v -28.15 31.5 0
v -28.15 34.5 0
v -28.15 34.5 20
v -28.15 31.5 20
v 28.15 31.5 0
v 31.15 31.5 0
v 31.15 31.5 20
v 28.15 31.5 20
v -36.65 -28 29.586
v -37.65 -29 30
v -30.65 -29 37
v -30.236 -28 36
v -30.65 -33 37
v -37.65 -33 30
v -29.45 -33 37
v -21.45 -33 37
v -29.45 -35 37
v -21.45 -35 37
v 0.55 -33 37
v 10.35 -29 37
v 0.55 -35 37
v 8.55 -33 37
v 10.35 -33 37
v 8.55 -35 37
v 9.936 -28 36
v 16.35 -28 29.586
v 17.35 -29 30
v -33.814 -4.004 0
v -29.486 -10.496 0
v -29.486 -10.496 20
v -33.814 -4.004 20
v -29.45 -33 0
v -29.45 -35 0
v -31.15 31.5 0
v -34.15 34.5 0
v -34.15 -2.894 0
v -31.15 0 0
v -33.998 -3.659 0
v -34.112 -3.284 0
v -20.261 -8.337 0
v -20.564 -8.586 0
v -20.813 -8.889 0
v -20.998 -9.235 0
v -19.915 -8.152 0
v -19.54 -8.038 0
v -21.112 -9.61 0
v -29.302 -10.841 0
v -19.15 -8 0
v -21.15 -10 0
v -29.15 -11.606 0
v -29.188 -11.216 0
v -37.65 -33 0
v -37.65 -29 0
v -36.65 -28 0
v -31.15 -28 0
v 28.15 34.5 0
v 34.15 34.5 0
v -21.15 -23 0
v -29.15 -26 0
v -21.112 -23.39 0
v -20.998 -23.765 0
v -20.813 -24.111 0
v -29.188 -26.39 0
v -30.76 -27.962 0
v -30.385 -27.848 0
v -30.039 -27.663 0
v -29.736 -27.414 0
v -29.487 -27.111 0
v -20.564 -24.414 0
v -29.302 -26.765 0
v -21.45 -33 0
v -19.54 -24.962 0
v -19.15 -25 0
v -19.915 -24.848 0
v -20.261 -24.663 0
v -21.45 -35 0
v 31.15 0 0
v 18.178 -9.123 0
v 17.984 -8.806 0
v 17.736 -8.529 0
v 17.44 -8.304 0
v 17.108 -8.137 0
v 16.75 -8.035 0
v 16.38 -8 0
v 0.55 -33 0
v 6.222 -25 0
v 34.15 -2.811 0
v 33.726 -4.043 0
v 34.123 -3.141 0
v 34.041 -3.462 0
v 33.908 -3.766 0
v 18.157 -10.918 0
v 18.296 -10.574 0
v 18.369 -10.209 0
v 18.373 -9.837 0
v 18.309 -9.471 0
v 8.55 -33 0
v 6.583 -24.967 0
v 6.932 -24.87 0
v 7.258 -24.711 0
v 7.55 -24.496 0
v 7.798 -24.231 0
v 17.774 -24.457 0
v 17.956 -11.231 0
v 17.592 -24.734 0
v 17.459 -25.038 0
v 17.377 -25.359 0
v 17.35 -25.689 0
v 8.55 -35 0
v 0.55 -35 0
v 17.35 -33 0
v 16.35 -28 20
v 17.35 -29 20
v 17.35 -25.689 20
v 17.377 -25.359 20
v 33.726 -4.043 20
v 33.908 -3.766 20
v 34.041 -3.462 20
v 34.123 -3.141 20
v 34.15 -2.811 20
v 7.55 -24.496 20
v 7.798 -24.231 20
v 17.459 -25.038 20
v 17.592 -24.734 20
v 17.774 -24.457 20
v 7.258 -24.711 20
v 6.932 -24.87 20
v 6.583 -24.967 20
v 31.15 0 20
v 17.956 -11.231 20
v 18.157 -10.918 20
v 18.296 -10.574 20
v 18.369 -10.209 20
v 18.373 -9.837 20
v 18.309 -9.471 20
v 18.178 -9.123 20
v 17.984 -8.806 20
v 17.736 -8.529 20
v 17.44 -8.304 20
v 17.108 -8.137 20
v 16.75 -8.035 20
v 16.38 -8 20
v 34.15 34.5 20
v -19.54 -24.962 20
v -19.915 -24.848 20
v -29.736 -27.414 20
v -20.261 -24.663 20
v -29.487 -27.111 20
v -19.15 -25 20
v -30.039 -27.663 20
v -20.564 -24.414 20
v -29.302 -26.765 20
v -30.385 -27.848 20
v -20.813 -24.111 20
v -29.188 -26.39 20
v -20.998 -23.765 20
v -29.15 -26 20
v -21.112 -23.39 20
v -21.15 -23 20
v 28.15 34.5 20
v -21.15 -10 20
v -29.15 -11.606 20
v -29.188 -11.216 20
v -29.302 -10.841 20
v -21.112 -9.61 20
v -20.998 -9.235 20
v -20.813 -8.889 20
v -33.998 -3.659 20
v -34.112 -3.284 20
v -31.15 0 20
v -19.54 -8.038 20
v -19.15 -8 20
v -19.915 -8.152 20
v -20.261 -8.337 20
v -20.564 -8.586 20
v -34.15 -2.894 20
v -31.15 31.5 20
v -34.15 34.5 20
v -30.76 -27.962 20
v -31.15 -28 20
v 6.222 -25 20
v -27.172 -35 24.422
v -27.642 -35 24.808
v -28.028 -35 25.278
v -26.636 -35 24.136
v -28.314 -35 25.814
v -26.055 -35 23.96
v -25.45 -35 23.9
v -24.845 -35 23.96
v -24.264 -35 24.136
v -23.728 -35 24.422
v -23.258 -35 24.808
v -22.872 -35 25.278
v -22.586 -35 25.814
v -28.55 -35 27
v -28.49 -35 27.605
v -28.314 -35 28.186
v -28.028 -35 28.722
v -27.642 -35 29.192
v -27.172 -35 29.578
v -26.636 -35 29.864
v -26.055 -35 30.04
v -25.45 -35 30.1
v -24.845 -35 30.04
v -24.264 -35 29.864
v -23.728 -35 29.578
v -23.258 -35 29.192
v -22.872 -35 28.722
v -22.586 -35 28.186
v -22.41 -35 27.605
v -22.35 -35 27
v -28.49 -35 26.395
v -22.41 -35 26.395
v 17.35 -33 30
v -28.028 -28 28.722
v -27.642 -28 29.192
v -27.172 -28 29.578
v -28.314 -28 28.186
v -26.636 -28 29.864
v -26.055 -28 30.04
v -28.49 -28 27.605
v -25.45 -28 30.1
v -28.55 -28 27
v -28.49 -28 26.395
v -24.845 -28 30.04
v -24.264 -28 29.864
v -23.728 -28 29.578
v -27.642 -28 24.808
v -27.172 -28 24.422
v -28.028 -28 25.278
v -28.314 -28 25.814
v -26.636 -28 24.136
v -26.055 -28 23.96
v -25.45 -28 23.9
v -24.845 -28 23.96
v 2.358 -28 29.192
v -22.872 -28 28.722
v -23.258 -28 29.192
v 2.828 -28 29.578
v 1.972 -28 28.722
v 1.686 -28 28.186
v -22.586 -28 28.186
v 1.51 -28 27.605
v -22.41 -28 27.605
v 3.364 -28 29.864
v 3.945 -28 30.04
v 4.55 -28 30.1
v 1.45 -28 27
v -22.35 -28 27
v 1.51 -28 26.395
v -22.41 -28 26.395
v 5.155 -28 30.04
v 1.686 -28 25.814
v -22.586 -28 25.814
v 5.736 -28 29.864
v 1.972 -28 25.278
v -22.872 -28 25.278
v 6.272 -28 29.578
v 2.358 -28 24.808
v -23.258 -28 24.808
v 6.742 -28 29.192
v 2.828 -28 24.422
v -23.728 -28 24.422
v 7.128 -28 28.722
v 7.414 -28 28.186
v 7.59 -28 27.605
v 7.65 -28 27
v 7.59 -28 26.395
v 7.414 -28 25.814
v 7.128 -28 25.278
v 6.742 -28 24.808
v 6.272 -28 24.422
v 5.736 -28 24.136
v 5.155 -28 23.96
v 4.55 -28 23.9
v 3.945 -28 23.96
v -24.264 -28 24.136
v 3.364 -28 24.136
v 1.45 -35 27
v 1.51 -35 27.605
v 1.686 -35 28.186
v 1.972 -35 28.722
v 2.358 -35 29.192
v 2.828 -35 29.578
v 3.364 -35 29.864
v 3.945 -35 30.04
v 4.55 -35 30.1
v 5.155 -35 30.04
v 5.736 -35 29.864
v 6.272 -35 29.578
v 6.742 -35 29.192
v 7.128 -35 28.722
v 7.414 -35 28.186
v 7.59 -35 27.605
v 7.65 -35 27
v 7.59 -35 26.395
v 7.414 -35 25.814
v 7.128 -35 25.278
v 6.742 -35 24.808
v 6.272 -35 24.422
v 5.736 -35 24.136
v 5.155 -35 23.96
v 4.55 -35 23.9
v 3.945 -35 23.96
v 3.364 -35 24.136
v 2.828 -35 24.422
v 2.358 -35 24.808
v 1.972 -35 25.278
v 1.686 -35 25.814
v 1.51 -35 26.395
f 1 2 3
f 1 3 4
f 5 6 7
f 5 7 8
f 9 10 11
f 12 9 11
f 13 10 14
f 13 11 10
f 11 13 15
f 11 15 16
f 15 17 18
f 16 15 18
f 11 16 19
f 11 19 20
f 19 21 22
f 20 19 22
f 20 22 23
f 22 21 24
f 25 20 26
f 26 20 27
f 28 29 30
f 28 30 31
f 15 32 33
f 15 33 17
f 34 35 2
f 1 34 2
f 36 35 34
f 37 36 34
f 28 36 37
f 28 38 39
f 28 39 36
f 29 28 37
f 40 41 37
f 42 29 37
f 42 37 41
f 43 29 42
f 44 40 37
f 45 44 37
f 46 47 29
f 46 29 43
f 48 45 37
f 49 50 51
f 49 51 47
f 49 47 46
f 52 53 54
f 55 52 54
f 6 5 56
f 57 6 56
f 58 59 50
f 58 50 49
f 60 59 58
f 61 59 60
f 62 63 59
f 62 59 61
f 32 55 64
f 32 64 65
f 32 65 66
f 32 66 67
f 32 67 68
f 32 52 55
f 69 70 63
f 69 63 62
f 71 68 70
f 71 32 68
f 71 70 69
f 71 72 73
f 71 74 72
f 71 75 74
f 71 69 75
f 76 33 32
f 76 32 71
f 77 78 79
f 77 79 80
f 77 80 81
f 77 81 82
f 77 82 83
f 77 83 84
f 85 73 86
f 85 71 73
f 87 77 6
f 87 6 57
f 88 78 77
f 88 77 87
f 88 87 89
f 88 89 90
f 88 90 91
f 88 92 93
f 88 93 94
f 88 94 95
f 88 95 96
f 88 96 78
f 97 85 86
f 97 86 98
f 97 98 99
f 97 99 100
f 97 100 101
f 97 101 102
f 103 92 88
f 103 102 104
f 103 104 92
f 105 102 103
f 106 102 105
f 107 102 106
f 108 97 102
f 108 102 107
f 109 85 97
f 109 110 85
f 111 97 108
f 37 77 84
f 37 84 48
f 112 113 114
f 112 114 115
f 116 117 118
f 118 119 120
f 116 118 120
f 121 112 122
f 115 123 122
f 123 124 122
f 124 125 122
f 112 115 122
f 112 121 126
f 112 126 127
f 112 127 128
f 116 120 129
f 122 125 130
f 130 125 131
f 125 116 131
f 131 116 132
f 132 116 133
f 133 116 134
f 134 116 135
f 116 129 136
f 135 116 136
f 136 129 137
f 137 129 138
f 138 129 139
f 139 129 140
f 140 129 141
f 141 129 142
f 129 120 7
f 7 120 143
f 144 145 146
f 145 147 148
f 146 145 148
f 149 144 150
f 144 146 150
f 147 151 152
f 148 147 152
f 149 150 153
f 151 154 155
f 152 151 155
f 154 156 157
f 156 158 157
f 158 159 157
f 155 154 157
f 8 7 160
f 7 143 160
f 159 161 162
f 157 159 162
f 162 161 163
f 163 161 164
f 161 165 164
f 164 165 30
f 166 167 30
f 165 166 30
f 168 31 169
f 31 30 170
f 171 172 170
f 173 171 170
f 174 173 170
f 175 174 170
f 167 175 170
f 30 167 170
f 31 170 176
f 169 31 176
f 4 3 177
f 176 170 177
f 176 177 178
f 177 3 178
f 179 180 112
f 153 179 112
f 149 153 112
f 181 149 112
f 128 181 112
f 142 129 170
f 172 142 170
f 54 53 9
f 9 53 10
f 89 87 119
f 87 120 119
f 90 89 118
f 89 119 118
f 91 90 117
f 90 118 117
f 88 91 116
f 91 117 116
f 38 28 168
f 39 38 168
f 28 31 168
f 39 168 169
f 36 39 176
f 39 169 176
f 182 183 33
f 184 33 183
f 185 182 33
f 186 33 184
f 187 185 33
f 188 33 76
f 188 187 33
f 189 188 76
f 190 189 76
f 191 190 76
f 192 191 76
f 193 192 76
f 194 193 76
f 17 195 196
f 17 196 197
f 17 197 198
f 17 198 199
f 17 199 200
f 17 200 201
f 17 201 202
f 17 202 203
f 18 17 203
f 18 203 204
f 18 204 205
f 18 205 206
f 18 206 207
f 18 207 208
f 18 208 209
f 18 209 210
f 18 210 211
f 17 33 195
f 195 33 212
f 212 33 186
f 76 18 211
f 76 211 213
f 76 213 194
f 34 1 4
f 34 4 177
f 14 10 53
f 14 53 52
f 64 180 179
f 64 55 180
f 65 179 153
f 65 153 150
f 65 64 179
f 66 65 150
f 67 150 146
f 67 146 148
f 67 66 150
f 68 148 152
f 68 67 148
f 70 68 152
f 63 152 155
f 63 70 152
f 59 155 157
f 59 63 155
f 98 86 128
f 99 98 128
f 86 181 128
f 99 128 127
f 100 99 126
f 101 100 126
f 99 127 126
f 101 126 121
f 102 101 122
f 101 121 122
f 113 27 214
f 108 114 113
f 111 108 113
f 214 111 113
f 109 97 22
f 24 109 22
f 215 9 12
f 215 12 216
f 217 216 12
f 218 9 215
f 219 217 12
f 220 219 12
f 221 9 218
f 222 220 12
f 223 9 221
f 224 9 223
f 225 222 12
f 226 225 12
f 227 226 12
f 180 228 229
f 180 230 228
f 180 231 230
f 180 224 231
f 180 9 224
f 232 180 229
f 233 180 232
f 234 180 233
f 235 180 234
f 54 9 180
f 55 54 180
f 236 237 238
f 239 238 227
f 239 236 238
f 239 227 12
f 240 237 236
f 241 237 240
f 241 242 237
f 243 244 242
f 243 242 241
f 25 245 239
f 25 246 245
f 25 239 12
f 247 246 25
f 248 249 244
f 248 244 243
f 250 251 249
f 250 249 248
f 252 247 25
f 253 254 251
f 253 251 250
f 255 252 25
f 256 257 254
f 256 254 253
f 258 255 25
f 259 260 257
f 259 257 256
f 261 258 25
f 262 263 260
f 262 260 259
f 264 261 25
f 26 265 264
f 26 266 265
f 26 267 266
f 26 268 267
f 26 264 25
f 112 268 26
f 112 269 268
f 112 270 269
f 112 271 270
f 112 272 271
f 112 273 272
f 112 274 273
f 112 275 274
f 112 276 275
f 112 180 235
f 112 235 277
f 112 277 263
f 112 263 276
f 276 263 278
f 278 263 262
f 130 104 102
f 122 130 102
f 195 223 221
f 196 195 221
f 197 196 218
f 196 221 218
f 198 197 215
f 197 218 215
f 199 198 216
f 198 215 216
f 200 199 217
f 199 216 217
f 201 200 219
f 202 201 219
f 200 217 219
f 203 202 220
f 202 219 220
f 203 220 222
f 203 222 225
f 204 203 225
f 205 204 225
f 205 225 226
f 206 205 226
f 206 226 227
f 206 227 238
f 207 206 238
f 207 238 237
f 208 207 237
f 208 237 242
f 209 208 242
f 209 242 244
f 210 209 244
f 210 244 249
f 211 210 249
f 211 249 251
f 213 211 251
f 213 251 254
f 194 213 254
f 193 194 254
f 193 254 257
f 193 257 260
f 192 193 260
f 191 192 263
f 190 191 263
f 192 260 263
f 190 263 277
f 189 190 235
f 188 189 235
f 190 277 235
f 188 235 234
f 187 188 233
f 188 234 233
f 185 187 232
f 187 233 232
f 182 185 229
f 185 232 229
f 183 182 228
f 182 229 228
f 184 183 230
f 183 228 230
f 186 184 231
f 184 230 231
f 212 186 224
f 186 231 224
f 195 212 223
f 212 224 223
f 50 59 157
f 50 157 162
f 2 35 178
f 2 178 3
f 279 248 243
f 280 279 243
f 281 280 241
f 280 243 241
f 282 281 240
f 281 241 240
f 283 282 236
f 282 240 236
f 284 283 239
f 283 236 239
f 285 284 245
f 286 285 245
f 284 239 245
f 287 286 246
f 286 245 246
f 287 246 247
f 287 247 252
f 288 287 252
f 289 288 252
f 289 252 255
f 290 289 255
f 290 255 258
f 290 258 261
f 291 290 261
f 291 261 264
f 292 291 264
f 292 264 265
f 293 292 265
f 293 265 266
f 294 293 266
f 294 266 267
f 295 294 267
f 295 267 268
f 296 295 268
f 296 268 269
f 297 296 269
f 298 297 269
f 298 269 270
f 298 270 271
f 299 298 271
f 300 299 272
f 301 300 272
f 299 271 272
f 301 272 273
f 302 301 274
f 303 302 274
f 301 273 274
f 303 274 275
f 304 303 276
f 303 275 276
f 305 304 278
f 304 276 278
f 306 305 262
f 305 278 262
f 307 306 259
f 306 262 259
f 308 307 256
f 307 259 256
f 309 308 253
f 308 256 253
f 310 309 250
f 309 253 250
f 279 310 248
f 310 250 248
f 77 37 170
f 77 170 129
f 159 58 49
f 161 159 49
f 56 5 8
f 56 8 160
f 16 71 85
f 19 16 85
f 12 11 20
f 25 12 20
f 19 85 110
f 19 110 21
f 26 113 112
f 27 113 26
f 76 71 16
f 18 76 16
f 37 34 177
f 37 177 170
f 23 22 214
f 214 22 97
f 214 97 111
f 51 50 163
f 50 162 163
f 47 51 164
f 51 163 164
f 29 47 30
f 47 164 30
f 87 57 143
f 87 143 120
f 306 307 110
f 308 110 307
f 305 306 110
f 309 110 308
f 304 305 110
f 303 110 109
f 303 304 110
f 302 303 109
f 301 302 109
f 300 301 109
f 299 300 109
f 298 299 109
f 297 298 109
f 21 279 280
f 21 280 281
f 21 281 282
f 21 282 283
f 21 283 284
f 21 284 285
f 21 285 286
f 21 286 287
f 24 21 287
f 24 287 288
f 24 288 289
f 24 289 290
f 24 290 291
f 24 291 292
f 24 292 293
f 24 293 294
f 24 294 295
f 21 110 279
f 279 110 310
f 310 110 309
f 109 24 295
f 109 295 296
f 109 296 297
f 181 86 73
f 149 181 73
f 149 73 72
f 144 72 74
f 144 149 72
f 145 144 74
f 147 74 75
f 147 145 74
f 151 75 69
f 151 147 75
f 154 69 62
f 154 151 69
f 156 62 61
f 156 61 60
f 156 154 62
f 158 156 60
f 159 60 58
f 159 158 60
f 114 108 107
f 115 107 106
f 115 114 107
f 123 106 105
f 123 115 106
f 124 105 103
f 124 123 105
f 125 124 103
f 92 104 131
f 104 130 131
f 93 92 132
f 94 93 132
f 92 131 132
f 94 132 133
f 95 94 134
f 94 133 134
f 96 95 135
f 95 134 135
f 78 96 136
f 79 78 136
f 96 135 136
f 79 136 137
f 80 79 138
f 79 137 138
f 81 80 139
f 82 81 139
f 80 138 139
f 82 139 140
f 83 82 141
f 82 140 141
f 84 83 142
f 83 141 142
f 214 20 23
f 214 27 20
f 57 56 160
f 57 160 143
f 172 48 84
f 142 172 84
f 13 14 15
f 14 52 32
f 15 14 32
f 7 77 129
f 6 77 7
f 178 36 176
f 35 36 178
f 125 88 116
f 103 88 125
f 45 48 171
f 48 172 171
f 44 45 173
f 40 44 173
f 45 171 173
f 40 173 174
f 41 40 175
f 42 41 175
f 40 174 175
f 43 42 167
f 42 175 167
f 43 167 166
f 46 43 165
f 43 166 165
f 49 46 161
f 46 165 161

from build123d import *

# Parameters (mm, degrees)
PAD_DEPTH       = 20
SKETCH001_W     = 55
SKETCH001_H     = 5
PAD001_DEPTH    = 37
SKETCH002_W     = 8
SKETCH002_H     = 37
PAD002_DEPTH    = 2
SKETCH003_R     = 3.1
POCKET_DEPTH    = 7.001
CHAMFER_SIZE    = 7
FILLET_R        = 2
CHAMFER001_SIZE = 1


with BuildPart() as part:
    # Sketch → Pad (new body)
    with BuildSketch(Plane.XY):
        Polygon((-31.15, 0), (31.15, 0), (31.15, 31.5), (28.15, 31.5), (28.15, 34.5), (34.15, 34.5), (34.15, -3.5), (17.35, -25), (17.35, -33), (-29.15, -33), (-29.15, -11), (-34.15, -3.5), (-34.15, 34.5), (-28.15, 34.5), (-28.15, 31.5), (-31.15, 31.5), align=None)
        Polygon((-21.15, -8), (20.481035, -8), (7.197314, -25), (-21.15, -25), align=None, mode=Mode.SUBTRACT)
    extrude(amount=PAD_DEPTH)

    # Sketch001 (on Face21 of Pad) → Pad001 (join)
    with BuildSketch(Plane(origin=(0, 0, 0), x_dir=(1, 0, 0), z_dir=(0, 0, -1))):
        with Locations((-10.15, 30.5)):
            Rectangle(SKETCH001_W, SKETCH001_H)
    extrude(amount=-PAD001_DEPTH)

    # Sketch002 (on Face25 of Pad001) → Pad002 (join)
    with BuildSketch(Plane.XZ.offset(33)):
        with Locations((4.55, 18.5)):
            Rectangle(SKETCH002_W, SKETCH002_H)
        with Locations((-25.45, 18.5)):
            Rectangle(SKETCH002_W, SKETCH002_H)
    extrude(amount=PAD002_DEPTH)

    # Sketch003 (on Face19 of Pad002) → Pocket (cut, through all)
    with BuildSketch(Plane(origin=(0, -28, 0), x_dir=(-1, 0, 0), z_dir=(0, 1, 0))):
        with Locations((-4.55, 27)):
            Circle(SKETCH003_R)
        with Locations((25.45, 27)):
            Circle(SKETCH003_R)
    extrude(amount=-POCKET_DEPTH, mode=Mode.SUBTRACT)

    # Chamfer
    chamfer_edges = [part.edges().sort_by_distance(p)[0] for p in [
        (-37.65, -30.5, 37),
        (17.35, -30.5, 37),
    ]]
    chamfer(chamfer_edges, length=CHAMFER_SIZE)

    # Fillet
    fillet_edges = [part.edges().sort_by_distance(p)[0] for p in [
        (-29.15, -28, 10),
        (-29.15, -11, 10),
        (-34.15, -3.5, 10),
        (17.35, -25, 10),
        (34.15, -3.5, 10),
        (7.197314, -25, 10),
        (20.481035, -8, 10),
        (-21.15, -8, 10),
        (-21.15, -25, 10),
    ]]
    fillet(fillet_edges, radius=FILLET_R)

    # Chamfer001
    chamfer001_edges = [part.edges().sort_by_distance(p)[0] for p in [
        (-34.15, -28, 33.5),
        (-37.65, -28, 15),
        (-10.15, -28, 37),
        (13.85, -28, 33.5),
        (17.35, -28, 25),
    ]]
    chamfer(chamfer001_edges, length=CHAMFER001_SIZE)


solid = part.part
